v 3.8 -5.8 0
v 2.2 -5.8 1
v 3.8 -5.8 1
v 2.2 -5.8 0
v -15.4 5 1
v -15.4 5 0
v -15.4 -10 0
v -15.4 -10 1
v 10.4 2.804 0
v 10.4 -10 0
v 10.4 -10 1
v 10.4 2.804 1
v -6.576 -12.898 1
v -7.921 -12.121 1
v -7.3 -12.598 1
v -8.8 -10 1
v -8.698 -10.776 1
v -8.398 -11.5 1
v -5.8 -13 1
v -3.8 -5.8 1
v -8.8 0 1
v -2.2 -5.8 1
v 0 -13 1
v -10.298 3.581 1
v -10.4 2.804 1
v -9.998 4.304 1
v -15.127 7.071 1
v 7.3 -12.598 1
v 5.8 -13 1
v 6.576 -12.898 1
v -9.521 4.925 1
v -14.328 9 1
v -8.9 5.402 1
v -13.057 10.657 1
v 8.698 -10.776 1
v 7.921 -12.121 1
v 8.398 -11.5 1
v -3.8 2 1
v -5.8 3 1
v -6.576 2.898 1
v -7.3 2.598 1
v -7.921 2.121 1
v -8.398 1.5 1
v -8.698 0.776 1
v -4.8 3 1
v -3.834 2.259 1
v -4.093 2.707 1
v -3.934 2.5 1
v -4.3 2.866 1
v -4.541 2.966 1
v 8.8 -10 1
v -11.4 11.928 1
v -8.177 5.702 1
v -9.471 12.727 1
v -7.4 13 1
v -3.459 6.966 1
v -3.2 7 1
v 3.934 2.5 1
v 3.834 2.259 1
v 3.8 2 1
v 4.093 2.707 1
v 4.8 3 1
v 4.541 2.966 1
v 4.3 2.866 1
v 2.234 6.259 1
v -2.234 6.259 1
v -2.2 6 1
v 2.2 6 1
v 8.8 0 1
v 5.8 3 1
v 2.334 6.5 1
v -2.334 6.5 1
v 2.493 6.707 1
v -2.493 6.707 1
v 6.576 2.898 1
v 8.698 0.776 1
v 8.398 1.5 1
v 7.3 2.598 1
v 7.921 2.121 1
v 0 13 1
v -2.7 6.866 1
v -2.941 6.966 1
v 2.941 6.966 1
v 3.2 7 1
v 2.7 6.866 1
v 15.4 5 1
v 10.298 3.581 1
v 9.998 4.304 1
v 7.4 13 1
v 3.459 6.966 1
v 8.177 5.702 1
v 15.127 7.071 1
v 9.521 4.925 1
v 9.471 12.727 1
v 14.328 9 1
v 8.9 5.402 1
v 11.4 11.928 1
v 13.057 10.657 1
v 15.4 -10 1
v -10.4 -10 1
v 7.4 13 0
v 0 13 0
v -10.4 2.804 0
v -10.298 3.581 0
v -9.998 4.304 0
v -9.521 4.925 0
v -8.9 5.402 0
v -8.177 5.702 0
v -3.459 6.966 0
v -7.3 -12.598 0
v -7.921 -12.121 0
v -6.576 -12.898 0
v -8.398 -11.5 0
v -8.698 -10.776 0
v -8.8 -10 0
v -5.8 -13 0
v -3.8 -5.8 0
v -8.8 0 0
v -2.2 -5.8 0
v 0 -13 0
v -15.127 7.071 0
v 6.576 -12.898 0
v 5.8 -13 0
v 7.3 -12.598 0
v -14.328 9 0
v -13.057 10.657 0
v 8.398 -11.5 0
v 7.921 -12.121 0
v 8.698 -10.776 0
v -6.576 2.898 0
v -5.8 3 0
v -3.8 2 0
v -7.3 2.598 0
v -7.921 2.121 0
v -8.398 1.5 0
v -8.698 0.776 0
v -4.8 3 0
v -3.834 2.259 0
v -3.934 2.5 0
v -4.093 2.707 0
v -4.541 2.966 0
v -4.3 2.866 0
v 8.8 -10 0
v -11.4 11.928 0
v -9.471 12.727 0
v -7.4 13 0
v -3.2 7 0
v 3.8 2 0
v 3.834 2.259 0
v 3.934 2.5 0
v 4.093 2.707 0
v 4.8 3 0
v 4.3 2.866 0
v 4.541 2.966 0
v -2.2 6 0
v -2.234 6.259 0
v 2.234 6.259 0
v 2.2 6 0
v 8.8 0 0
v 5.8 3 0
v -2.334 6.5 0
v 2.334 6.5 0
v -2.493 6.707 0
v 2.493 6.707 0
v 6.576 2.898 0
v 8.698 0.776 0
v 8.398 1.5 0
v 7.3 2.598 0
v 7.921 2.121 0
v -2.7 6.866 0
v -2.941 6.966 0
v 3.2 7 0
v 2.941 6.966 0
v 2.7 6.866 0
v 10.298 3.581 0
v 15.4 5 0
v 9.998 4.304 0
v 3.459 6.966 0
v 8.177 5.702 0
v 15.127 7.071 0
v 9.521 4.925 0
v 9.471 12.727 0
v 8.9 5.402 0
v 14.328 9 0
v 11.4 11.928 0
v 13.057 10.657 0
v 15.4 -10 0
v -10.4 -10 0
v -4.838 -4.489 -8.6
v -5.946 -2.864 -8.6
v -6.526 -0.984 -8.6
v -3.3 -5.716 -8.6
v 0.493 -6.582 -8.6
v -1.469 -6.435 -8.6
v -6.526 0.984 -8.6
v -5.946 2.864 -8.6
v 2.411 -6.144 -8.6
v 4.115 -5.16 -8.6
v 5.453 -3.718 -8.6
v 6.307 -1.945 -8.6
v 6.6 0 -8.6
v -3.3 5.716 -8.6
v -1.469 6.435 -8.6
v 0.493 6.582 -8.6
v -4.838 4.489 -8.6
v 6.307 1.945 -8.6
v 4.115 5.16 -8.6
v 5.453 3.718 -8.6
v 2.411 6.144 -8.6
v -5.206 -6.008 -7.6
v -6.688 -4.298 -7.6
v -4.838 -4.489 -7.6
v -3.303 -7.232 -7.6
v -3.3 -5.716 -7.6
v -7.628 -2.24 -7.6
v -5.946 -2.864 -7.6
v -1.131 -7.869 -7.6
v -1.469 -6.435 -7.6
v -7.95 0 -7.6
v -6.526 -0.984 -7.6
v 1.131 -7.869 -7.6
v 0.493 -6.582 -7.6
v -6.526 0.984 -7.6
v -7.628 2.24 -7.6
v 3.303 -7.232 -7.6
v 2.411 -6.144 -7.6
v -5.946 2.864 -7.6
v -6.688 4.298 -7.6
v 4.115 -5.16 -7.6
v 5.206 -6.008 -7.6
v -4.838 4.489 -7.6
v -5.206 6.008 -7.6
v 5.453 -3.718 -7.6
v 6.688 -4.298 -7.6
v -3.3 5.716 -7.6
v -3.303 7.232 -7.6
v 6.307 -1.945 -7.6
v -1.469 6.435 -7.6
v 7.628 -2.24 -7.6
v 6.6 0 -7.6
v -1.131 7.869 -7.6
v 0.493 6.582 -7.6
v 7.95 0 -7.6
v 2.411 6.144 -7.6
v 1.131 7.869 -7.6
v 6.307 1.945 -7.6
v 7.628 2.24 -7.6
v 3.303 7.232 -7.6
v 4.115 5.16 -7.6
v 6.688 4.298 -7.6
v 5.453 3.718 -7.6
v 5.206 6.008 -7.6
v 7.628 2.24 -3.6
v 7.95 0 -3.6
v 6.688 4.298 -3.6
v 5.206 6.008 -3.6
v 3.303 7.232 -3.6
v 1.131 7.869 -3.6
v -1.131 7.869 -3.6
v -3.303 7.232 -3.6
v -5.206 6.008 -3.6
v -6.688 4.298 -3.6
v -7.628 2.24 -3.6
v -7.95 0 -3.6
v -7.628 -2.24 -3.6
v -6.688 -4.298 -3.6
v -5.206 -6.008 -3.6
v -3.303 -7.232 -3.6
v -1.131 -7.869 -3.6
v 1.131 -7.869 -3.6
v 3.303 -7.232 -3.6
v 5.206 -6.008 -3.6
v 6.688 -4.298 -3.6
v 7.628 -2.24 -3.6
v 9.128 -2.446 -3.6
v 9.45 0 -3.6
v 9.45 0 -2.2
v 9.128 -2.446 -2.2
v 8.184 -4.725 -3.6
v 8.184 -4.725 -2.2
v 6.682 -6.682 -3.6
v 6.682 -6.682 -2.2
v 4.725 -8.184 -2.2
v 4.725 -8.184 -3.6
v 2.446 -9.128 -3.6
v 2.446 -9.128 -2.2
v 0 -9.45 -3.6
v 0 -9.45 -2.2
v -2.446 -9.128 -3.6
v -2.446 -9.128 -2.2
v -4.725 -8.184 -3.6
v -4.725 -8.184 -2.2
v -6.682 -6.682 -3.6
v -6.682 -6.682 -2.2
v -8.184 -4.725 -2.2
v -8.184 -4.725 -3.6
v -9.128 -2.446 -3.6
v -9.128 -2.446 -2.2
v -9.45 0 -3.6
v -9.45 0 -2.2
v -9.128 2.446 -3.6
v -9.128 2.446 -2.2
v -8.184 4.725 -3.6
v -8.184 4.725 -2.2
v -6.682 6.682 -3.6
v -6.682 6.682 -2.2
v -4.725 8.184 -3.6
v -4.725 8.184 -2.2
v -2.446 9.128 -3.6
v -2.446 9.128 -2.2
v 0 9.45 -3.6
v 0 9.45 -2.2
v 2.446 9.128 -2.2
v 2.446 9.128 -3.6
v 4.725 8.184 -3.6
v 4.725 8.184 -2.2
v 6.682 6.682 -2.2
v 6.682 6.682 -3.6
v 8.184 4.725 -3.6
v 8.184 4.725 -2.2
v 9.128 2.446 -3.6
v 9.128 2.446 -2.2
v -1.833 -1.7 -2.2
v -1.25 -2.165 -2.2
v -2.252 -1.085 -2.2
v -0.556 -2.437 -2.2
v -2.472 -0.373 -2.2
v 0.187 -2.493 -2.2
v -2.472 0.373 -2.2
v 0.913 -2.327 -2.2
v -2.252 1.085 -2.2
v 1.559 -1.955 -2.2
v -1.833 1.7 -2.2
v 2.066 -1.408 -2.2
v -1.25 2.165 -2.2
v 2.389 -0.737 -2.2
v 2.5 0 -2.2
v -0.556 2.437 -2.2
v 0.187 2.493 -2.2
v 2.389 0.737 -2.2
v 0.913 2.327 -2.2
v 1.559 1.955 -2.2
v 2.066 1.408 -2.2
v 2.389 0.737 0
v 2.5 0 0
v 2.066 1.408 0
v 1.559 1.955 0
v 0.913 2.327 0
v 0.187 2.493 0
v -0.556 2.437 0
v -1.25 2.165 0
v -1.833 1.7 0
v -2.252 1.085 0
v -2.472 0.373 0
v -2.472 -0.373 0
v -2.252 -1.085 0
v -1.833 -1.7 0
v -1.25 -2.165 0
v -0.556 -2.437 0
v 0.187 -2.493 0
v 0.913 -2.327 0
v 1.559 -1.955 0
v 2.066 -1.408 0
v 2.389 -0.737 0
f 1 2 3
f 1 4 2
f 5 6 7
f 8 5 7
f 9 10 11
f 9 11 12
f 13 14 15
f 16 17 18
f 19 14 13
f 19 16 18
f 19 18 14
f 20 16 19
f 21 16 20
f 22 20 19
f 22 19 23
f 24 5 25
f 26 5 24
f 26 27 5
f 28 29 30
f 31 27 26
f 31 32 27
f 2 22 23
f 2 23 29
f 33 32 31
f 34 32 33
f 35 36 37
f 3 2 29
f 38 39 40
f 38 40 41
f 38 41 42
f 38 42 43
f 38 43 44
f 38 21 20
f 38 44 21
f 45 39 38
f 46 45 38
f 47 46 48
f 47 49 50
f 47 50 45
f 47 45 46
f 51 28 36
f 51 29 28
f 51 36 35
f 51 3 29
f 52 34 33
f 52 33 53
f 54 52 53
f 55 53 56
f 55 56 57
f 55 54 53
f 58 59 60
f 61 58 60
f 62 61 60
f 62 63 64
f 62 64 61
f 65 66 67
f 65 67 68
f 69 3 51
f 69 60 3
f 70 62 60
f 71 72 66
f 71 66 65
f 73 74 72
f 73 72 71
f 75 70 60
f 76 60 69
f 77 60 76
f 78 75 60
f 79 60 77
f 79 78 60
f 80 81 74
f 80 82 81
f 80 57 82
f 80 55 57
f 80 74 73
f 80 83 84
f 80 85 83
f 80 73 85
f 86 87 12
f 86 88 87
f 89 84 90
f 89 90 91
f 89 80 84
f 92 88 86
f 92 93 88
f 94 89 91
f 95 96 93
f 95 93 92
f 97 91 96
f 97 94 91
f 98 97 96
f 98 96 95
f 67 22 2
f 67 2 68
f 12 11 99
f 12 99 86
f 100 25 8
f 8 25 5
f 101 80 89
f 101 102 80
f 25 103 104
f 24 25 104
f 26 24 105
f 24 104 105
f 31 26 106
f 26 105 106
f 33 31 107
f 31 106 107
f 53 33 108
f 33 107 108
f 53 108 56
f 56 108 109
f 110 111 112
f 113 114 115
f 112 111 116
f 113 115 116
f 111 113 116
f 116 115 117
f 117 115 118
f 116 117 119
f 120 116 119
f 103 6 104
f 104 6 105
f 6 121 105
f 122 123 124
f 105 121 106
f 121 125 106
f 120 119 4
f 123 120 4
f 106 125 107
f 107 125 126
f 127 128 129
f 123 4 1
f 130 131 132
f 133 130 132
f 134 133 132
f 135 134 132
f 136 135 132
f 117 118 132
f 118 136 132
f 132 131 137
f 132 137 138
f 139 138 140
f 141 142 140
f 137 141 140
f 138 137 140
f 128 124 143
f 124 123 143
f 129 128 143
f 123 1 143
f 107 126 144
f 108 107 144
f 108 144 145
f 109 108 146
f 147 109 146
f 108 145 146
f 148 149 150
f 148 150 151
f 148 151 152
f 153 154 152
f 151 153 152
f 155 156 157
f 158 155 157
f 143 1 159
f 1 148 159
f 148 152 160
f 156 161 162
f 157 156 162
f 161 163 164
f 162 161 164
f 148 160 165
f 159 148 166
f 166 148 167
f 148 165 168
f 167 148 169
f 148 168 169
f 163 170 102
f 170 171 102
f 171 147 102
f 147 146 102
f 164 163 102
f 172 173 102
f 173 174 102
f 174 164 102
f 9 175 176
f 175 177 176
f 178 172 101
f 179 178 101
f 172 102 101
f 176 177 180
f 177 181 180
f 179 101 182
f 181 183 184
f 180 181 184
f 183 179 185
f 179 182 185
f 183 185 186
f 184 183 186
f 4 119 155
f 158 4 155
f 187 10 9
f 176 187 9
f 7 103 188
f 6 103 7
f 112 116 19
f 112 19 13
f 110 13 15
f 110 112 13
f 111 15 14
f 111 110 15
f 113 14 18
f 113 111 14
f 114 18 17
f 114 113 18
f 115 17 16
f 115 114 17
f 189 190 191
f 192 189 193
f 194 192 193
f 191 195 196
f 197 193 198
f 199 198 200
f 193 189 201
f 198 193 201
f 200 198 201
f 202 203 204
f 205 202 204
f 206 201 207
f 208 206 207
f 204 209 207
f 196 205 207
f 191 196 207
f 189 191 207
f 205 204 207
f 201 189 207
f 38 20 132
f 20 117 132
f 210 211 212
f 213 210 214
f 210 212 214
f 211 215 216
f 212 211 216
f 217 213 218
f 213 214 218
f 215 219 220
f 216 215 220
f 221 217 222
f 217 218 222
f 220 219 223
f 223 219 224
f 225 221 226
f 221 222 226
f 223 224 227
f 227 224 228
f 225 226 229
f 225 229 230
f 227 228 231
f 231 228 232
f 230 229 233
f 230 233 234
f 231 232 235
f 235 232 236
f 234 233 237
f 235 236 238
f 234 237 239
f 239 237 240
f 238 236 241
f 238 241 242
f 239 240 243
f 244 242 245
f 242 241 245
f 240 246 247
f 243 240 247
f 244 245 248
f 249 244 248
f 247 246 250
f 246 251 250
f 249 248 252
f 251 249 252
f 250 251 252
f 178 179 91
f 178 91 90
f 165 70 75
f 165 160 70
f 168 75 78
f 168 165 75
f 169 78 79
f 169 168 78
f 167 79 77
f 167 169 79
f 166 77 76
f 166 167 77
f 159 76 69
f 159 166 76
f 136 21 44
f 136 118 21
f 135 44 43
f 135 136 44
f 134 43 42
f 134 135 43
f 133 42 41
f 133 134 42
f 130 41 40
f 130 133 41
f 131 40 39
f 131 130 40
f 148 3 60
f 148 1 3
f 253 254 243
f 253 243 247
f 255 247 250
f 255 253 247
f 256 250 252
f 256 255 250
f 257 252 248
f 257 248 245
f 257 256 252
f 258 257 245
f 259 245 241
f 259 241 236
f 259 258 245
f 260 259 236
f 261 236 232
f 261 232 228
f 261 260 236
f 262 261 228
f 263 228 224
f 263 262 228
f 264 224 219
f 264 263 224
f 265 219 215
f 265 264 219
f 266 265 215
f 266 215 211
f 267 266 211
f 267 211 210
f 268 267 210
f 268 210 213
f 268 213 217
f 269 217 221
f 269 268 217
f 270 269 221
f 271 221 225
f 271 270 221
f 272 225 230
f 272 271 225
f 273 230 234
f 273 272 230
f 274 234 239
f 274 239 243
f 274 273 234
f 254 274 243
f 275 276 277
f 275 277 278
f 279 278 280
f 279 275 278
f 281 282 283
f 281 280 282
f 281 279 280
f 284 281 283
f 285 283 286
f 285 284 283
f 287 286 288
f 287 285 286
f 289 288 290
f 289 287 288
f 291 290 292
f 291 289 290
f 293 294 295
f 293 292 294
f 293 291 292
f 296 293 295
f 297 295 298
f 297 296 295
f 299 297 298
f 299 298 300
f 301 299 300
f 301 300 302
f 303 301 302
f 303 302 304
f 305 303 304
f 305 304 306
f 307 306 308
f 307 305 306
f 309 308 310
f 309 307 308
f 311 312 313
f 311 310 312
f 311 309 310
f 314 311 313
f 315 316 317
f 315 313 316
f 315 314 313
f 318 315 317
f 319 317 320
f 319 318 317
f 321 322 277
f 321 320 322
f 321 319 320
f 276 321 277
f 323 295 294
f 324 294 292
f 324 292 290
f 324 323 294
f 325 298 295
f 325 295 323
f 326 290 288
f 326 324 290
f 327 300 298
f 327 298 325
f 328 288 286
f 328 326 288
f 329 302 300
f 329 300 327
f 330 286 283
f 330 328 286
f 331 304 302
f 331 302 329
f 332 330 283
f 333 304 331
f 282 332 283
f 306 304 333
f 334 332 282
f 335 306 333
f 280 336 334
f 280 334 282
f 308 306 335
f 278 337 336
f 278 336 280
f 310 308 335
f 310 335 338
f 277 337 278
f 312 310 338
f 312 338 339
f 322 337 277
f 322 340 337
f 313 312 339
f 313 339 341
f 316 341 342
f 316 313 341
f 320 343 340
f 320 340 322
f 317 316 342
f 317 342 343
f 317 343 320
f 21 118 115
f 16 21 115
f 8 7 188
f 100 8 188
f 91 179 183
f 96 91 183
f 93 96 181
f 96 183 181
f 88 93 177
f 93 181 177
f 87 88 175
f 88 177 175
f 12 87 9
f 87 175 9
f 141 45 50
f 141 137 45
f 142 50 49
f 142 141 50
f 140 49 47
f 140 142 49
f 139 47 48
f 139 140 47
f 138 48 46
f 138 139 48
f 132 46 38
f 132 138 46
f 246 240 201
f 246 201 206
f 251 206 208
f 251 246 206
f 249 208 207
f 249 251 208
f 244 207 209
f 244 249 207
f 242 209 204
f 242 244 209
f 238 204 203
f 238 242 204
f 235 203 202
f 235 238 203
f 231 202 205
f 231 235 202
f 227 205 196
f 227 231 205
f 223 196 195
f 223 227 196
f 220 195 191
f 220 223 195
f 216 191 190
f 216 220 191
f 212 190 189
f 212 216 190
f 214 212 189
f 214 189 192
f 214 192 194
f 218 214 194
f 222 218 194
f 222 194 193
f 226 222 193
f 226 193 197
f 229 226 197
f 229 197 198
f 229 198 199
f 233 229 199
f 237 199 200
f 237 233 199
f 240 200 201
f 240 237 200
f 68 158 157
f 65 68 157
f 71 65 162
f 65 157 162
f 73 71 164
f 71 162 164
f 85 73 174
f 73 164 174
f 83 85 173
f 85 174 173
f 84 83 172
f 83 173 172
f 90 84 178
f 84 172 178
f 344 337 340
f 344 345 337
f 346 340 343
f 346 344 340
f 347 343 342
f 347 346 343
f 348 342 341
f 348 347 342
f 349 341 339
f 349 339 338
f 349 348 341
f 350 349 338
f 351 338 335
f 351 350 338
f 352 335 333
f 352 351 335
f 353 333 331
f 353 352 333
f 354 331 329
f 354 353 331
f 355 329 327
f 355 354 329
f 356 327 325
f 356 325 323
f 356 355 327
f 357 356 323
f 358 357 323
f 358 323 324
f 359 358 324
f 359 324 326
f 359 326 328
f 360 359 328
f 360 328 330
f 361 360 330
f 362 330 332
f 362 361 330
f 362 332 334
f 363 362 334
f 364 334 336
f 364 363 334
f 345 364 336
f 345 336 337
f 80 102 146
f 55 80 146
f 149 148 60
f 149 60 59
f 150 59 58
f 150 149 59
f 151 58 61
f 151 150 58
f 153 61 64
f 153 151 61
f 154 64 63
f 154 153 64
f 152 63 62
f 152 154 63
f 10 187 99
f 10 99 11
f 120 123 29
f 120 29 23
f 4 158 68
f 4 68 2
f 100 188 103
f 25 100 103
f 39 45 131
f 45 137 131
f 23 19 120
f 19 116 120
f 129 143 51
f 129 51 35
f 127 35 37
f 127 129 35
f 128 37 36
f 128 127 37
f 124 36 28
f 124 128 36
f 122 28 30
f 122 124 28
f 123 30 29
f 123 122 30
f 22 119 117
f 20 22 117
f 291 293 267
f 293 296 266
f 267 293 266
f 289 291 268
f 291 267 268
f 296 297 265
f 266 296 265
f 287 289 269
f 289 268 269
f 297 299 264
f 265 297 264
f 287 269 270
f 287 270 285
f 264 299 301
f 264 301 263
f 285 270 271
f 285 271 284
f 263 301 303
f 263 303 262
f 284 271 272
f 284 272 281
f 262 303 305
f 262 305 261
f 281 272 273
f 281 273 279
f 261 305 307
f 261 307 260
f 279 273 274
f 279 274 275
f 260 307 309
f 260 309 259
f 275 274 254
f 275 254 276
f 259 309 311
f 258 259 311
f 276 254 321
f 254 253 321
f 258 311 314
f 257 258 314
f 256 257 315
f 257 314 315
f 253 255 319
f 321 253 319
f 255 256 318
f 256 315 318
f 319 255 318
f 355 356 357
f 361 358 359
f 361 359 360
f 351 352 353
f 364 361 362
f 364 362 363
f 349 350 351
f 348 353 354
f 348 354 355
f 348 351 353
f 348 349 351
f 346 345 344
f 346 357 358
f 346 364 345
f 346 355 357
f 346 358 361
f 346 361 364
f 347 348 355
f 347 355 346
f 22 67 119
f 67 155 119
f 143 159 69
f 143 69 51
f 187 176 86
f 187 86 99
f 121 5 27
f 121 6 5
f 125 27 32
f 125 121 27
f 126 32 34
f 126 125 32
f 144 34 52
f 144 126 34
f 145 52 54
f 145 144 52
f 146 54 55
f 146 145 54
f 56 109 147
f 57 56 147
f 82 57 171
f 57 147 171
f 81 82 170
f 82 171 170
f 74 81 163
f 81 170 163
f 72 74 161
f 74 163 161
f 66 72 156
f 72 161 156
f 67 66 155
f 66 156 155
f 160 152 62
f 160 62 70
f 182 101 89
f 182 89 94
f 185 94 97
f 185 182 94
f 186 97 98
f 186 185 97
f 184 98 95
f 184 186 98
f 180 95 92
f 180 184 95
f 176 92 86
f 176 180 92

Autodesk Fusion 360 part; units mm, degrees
sketch "Cell" plane through (0, 0, 0) normal (0, 0, 1) x (1, 0, 0)
  line L0 (0, 13) -> (7.4, 13)
  line L1 (15.4, 5) -> (15.4, -10)
  arc A0 (15.4, 5) -> (7.4, 13) centre (7.4, 5) ccw
  line L2 (15.4, -10) -> (10.4, -10)
  line L3 (10.4, -10) -> (10.4, 2.8041)
  line L4 (8.1765, 5.7018) -> (3.4588, 6.9659)
  line L5 (2.2, 6) -> (2.2, -5.8)
  line L6 (2.2, -5.8) -> (3.8, -5.8)
  line L7 (3.8, -5.8) -> (3.8, 2)
  line L8 (4.8, 3) -> (5.8, 3)
  line L9 (8.8, 0) -> (8.8, -10)
  line L10 (5.8, -13) -> (0, -13)
  line L11 (0, -25.6474) -> (0, 25.6474) construction
  arc A1 (10.4, 2.8041) -> (8.1765, 5.7018) centre (7.4, 2.8041) ccw
  arc A2 (5.8, -13) -> (8.8, -10) centre (5.8, -10) ccw
  arc A3 (8.8, 0) -> (5.8, 3) centre (5.8, 0) ccw
  arc A4 (4.8, 3) -> (3.8, 2) centre (4.8, 2) ccw
  arc A5 (3.4588, 6.9659) -> (2.2, 6) centre (3.2, 6) ccw
  line L12 (-5.8, -13) -> (0, -13)
  arc A6 (-8.8, -10) -> (-5.8, -13) centre (-5.8, -10) ccw
  line L13 (-8.8, 0) -> (-8.8, -10)
  arc A7 (-5.8, 3) -> (-8.8, 0) centre (-5.8, 0) ccw
  line L14 (-4.8, 3) -> (-5.8, 3)
  arc A8 (-3.8, 2) -> (-4.8, 3) centre (-4.8, 2) ccw
  line L15 (-3.8, -5.8) -> (-3.8, 2)
  line L16 (-2.2, -5.8) -> (-3.8, -5.8)
  line L17 (-2.2, 6) -> (-2.2, -5.8)
  arc A9 (-2.2, 6) -> (-3.4588, 6.9659) centre (-3.2, 6) ccw
  line L18 (-8.1765, 5.7018) -> (-3.4588, 6.9659)
  arc A10 (-8.1765, 5.7018) -> (-10.4, 2.8041) centre (-7.4, 2.8041) ccw
  line L19 (-10.4, -10) -> (-10.4, 2.8041)
  line L20 (-15.4, -10) -> (-10.4, -10)
  line L21 (-15.4, 5) -> (-15.4, -10)
  arc A11 (-7.4, 13) -> (-15.4, 5) centre (-7.4, 5) ccw
  line L22 (0, 13) -> (-7.4, 13)
  dimension "d3" = 8
  dimension "d4" = 5
  dimension "d7" = 26
  dimension "d8" = 16
  dimension "d9" = 1.6
  dimension "d10" = 1.6
  dimension "d12" = 7.2
  dimension "d13" = 23
  dimension "d14" = 3
  dimension "d15" = 3
  dimension "d16" = 3
  dimension "d17" = 1
  dimension "d18" = 1
  dimension "d19" = 7
  dimension "d20" = 13
  dimension "d21" = 75
  dimension "d22" = 2.2
  dimension "d23" = 5
extrude "Extrude1" add sketch "Cell" along normal blind 1 makes body 1
sketch "Foot" plane through (0, 0, 0) normal (0, 0, 1) x (1, 0, 0)
  circle A0 centre (0, 0) radius 7.95
  circle A1 centre (0, 0) radius 9.45
  circle A2 centre (0, 0) radius 6.6
  circle A3 centre (0, 0) radius 2.5
  dimension "d26" = 15.9
  dimension "d27" = 18.9
  dimension "d28" = 13.2
  dimension "d29" = 5
extrude "Extrude2" add sketch "Foot" against normal blind 3.6 separate body contours A3 makes body 2
extrude "Extrude3" add sketch "Foot" along normal blind 1.4 from surface at -3.6 contours A0 | A1 | A2 bodies 2
extrude "Extrude4" add sketch "Foot" against normal blind 4 from surface at -3.6 contours A0 | A2 | A3 bodies 2
extrude "Extrude5" add sketch "Foot" against normal blind 1 from surface at -7.6 contours A2 | A3 bodies 2
equation "d22 = ( 4.4 / 2 ) * 1 mm"
